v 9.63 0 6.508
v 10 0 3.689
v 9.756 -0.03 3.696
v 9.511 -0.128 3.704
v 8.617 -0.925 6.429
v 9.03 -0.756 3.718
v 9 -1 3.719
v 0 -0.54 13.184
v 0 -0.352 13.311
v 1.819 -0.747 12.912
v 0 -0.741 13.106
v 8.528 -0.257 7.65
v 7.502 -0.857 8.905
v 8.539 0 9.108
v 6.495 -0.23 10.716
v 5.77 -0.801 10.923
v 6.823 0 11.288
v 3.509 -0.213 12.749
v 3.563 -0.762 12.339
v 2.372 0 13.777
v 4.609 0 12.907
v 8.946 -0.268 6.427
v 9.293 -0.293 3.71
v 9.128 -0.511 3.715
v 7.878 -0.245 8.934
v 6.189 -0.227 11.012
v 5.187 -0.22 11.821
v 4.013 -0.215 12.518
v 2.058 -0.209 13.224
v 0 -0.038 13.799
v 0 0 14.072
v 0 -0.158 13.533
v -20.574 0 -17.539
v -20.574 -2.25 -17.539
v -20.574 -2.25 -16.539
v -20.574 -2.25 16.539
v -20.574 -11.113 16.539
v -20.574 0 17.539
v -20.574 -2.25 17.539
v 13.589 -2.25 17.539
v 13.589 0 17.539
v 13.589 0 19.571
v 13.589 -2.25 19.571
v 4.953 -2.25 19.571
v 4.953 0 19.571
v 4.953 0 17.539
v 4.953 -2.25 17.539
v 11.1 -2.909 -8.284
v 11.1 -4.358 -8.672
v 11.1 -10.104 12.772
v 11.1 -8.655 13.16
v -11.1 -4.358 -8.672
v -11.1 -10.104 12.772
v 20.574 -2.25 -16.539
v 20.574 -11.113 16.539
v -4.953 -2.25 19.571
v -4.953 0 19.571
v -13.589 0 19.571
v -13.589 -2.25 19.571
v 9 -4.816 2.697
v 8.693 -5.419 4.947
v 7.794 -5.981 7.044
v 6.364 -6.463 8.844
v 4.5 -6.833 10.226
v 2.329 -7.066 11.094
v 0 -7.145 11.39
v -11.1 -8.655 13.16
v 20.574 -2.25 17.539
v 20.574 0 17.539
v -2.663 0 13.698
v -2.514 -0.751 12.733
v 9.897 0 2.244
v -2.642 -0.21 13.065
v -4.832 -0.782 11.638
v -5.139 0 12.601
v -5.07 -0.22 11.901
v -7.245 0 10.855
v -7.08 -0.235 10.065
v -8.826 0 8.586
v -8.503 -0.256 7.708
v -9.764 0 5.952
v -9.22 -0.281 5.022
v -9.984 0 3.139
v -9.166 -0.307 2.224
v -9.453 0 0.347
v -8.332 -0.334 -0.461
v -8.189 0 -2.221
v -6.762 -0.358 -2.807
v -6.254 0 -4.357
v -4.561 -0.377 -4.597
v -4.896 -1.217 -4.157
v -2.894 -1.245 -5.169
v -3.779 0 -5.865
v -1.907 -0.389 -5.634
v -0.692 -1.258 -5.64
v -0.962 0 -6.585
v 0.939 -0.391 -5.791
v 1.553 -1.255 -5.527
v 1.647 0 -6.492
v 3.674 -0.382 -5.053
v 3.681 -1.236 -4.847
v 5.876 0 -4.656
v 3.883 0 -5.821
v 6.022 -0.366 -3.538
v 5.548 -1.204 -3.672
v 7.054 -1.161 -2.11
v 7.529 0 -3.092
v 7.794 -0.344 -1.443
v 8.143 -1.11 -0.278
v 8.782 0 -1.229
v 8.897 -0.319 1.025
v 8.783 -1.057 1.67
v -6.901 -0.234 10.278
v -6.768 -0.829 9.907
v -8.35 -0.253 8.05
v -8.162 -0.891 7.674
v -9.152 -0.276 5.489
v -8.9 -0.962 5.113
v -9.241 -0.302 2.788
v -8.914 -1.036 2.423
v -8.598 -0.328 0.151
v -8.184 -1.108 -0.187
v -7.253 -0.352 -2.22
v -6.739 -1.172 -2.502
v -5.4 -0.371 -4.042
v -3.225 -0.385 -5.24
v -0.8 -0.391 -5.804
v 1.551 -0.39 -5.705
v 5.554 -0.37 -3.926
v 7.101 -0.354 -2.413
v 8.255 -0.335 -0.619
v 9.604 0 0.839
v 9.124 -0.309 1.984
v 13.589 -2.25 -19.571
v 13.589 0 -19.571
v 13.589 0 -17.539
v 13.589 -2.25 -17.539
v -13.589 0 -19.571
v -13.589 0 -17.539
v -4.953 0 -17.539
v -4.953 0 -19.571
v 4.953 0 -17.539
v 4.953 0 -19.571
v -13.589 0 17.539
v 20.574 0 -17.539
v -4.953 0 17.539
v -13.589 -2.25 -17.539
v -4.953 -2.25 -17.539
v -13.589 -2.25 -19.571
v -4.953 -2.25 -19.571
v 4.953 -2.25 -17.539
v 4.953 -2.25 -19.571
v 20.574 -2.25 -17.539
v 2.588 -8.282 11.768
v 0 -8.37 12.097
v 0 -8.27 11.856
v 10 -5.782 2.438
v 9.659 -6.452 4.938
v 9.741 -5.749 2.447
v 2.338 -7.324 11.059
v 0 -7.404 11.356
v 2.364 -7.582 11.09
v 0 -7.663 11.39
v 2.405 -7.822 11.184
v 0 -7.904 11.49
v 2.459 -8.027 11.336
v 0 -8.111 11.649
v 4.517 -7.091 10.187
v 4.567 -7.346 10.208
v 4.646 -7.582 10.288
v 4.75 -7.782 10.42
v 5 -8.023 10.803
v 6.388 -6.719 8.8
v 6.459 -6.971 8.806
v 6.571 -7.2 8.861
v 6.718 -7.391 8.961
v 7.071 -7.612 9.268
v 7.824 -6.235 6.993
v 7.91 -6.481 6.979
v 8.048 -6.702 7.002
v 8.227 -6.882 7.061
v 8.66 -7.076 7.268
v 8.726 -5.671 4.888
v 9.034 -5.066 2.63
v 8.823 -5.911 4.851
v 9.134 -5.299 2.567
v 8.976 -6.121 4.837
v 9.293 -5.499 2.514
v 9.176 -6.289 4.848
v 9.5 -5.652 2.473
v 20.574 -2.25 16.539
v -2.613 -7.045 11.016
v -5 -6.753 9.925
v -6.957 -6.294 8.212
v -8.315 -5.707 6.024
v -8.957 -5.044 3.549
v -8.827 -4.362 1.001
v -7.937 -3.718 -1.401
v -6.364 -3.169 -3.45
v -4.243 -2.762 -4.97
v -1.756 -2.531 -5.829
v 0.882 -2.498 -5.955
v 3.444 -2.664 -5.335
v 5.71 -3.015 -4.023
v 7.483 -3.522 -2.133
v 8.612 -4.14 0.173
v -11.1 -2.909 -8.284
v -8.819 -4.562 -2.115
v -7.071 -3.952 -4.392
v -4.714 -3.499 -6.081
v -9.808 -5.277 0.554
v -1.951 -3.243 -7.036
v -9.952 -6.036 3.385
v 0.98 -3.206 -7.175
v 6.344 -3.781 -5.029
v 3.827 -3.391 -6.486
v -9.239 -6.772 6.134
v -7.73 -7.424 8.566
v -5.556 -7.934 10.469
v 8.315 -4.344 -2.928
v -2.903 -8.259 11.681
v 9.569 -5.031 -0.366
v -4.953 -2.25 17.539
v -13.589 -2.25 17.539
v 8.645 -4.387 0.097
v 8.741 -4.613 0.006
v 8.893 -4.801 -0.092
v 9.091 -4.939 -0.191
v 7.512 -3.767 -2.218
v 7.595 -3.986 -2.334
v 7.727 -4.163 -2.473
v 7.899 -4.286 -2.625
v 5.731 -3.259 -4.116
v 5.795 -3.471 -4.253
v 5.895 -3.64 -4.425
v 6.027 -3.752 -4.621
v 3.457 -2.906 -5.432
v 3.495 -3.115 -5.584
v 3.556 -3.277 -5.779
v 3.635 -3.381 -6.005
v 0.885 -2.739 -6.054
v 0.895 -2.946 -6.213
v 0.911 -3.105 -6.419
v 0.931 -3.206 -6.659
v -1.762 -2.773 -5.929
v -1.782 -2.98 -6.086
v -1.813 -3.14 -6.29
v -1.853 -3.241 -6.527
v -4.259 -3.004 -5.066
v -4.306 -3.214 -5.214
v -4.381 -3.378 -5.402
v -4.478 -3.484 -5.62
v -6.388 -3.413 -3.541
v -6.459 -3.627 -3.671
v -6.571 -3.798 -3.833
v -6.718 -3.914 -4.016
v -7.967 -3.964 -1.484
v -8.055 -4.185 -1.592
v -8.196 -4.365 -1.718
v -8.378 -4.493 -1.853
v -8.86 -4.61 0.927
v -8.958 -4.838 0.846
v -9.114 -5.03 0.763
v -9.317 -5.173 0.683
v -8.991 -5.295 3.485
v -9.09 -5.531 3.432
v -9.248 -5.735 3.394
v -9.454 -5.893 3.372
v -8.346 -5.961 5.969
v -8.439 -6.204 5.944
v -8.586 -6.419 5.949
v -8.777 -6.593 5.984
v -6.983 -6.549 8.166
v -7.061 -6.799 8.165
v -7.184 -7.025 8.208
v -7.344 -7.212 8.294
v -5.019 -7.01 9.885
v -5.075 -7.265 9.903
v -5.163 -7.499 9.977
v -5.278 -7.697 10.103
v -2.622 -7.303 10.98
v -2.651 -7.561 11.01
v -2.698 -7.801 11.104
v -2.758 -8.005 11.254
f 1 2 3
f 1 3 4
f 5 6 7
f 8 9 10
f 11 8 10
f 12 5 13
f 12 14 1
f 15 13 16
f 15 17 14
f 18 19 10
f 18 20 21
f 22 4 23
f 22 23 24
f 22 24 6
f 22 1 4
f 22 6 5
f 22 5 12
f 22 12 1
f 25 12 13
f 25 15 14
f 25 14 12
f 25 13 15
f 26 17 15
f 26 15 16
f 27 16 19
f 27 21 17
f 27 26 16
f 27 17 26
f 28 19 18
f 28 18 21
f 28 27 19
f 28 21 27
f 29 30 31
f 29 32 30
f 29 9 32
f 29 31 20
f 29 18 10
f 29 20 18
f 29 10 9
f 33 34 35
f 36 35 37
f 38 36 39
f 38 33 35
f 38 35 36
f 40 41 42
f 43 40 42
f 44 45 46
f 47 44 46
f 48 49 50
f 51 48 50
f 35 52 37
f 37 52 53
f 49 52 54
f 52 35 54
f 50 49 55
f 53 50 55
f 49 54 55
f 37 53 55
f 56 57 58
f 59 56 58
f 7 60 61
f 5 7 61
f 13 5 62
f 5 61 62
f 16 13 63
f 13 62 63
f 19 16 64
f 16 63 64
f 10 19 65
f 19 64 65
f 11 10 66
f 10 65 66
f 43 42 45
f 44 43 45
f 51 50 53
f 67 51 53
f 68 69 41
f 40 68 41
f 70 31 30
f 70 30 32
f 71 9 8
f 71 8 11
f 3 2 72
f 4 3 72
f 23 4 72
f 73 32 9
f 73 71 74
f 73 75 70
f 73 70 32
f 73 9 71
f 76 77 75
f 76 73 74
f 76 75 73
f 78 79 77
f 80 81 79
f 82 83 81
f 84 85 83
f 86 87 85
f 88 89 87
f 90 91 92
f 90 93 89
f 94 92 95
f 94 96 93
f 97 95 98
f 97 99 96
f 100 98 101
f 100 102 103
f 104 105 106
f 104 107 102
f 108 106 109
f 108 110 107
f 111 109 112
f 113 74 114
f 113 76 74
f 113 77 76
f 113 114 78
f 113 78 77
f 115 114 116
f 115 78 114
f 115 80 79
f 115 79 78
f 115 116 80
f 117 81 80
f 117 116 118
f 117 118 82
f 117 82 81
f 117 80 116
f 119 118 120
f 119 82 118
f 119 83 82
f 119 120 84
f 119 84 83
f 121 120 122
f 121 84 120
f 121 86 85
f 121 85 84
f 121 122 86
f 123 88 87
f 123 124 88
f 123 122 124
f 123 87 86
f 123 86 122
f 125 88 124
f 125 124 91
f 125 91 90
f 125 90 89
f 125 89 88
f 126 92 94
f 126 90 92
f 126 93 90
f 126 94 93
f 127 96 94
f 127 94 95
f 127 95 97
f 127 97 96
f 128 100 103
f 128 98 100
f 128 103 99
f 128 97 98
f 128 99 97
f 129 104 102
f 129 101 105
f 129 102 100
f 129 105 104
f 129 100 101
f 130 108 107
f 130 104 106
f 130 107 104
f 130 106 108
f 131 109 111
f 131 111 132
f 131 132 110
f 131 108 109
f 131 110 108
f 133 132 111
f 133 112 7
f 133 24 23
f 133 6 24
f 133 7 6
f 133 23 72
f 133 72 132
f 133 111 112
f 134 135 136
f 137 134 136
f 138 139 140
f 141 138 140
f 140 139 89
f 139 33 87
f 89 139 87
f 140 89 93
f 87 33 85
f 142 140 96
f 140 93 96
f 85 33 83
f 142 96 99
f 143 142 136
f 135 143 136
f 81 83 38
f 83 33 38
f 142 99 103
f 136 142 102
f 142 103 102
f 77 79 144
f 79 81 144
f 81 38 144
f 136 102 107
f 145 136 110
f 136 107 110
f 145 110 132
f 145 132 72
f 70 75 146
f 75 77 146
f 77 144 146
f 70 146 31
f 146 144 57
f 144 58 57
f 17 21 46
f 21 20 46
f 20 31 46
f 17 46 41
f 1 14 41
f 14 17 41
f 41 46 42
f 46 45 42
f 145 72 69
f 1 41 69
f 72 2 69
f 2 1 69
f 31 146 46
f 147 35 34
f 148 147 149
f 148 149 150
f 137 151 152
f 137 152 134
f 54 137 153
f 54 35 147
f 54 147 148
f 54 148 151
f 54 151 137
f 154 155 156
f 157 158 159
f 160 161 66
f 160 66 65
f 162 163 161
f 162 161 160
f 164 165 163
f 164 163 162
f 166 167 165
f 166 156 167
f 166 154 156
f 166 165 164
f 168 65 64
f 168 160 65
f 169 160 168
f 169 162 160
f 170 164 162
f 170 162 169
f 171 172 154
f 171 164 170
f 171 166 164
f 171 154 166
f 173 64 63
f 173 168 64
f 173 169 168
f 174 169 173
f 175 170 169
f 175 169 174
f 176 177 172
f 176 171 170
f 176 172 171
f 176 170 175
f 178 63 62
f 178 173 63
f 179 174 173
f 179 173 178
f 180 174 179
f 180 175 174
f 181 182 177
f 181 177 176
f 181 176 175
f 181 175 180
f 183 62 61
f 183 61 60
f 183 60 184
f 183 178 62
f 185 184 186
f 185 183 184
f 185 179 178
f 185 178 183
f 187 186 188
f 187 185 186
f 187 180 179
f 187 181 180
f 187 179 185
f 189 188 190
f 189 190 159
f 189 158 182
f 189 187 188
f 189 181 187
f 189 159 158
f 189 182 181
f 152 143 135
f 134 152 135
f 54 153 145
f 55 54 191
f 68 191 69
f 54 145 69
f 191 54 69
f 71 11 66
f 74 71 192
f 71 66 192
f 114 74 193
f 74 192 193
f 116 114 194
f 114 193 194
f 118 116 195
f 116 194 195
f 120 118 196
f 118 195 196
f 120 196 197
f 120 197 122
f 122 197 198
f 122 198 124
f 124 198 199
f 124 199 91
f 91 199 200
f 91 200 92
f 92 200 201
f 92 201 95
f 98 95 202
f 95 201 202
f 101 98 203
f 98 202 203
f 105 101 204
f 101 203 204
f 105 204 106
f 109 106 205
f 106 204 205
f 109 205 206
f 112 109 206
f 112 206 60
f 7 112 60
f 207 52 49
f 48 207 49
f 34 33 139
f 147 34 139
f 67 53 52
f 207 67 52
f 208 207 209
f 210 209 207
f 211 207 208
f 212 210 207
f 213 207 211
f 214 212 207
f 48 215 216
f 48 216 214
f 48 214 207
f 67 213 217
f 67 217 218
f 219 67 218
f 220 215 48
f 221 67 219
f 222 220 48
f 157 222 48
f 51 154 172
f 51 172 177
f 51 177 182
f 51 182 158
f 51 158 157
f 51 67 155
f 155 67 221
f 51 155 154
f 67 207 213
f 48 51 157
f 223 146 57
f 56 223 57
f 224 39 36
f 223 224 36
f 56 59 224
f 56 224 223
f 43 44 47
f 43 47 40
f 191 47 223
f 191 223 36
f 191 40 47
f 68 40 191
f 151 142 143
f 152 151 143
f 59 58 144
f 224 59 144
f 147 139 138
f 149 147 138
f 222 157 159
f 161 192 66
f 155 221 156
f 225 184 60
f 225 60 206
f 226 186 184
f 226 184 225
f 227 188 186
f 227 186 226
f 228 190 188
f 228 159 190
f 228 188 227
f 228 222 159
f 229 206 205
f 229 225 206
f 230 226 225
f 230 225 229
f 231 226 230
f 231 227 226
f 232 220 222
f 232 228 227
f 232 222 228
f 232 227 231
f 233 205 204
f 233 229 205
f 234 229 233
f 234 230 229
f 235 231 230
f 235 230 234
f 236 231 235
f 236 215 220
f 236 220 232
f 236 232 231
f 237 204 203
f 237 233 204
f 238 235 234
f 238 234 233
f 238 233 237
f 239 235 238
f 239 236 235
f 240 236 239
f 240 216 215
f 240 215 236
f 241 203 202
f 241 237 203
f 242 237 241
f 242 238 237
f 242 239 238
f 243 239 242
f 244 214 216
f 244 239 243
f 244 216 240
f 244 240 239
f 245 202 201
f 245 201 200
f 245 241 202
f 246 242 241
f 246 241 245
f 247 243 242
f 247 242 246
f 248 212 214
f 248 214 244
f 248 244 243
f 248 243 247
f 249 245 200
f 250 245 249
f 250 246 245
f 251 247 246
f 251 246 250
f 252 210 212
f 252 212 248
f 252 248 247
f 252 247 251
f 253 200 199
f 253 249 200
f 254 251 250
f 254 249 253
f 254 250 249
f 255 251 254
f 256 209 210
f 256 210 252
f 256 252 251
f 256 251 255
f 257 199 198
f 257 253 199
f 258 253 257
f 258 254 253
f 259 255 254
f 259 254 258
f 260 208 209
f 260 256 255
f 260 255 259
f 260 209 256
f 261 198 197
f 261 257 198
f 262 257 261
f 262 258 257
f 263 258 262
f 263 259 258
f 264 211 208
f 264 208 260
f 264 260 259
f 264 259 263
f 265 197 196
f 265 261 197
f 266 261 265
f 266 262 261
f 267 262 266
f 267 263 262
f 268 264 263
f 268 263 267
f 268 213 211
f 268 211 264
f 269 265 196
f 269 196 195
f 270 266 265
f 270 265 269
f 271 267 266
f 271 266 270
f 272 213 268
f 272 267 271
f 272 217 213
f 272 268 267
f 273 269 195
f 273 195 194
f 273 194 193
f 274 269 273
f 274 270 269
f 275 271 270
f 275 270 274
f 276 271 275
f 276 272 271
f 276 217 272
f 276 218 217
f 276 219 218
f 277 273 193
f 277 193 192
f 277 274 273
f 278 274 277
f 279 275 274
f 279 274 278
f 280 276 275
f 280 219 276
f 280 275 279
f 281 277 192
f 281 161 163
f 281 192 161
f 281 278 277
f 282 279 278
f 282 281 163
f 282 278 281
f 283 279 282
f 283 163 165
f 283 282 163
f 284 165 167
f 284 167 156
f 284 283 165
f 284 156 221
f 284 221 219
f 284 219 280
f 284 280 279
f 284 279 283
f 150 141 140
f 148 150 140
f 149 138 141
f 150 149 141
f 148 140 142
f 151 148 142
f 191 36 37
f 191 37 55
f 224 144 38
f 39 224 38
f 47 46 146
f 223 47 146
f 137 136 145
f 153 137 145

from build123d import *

# Parameters (mm, degrees)
F1_DEPTH = 2.25
F0_W     = 41.148
F0_H     = 33.0774
F2_DEPTH = 15
F5_DEPTH = 50
F7_DEPTH = 11.5201335364
F8_DEPTH = 1.5
F9_R     = 1


with BuildPart() as f1:
    # F0 (on Front) → F1 (new body)
    with BuildSketch(Plane.XZ):
        Polygon((13.589, 17.5387), (13.589, 19.5707), (4.953, 19.5707), (4.953, 17.5387), (-4.953, 17.5387), (-4.953, 19.5707), (-13.589, 19.5707), (-13.589, 17.5387), (-20.574, 17.5387), (-20.574, 16.5387), (20.574, 16.5387), (20.574, 17.5387), align=None)
    extrude(amount=F1_DEPTH)


with BuildPart() as f1b:
    # F0 (on Front) → F1, piece 2 (new body)
    with BuildSketch(Plane.XZ):
        Polygon((20.574, -17.5387), (20.574, -16.5387), (-20.574, -16.5387), (-20.574, -17.5387), (-13.589, -17.5387), (-13.589, -19.5707), (-4.953, -19.5707), (-4.953, -17.5387), (4.953, -17.5387), (4.953, -19.5707), (13.589, -19.5707), (13.589, -17.5387), align=None)
    extrude(amount=F1_DEPTH)


with BuildPart() as f2:
    # F0 (on Front) → F2 (new body)
    with BuildSketch(Plane.XZ):
        Rectangle(F0_W, F0_H)
    extrude(amount=F2_DEPTH)


with BuildPart() as f1_1:
    add(f1.part)

    # F3: union F1b, F2
    add(f1b.part)
    add(f2.part)

    # F4 (on face) → F5 (cut)
    with BuildSketch(Plane.YZ.offset(20.574)):
        Polygon((-15, -16.5387), (-2.25, -16.5387), (-11.1130626177, 16.5387), (-15, 16.5387), align=None)
    extrude(amount=-F5_DEPTH, mode=Mode.SUBTRACT)

    # F6 (on face) → F7 (cut, through all)
    with BuildSketch(Plane(origin=(0, -6.2339535793, -1.6703828272), x_dir=(1, 0, 0), z_dir=(0, -0.9659258263, -0.2588190451))):
        with BuildLine():
            ThreePointArc((9, 3.8514297181), (6.3639610307, 10.2153907488), (0, 12.8514297181))
            ThreePointArc((0, 12.8514297181), (-6.3639610307, -2.5125313125), (9, 3.8514297181))
        make_face()
    extrude(amount=-F7_DEPTH, mode=Mode.SUBTRACT)

    # F6 (on face) → F8 (cut)
    with BuildSketch(Plane(origin=(0, -6.2339535793, -1.6703828272), x_dir=(1, 0, 0), z_dir=(0, -0.9659258263, -0.2588190451))):
        Polygon((11.1, 14.9514297181), (0, 14.9514297181), (-11.1, 14.9514297181), (-11.1, -7.2485702819), (11.1, -7.2485702819), align=None)
        with BuildLine():
            ThreePointArc((9, 3.8514297181), (-6.3639610307, -2.5125313125), (0, 12.8514297181))
            ThreePointArc((0, 12.8514297181), (6.3639610307, 10.2153907488), (9, 3.8514297181))
        make_face(mode=Mode.SUBTRACT)
    extrude(amount=-F8_DEPTH, mode=Mode.SUBTRACT)

    # F9
    f9_edges = [f1_1.edges().sort_by_distance(p)[0] for p in [
        (-9, 0, 3.987295),
        (-9, -5.781888, 2.438041),
    ]]
    fillet(f9_edges, radius=F9_R)


solid = f1_1.part
